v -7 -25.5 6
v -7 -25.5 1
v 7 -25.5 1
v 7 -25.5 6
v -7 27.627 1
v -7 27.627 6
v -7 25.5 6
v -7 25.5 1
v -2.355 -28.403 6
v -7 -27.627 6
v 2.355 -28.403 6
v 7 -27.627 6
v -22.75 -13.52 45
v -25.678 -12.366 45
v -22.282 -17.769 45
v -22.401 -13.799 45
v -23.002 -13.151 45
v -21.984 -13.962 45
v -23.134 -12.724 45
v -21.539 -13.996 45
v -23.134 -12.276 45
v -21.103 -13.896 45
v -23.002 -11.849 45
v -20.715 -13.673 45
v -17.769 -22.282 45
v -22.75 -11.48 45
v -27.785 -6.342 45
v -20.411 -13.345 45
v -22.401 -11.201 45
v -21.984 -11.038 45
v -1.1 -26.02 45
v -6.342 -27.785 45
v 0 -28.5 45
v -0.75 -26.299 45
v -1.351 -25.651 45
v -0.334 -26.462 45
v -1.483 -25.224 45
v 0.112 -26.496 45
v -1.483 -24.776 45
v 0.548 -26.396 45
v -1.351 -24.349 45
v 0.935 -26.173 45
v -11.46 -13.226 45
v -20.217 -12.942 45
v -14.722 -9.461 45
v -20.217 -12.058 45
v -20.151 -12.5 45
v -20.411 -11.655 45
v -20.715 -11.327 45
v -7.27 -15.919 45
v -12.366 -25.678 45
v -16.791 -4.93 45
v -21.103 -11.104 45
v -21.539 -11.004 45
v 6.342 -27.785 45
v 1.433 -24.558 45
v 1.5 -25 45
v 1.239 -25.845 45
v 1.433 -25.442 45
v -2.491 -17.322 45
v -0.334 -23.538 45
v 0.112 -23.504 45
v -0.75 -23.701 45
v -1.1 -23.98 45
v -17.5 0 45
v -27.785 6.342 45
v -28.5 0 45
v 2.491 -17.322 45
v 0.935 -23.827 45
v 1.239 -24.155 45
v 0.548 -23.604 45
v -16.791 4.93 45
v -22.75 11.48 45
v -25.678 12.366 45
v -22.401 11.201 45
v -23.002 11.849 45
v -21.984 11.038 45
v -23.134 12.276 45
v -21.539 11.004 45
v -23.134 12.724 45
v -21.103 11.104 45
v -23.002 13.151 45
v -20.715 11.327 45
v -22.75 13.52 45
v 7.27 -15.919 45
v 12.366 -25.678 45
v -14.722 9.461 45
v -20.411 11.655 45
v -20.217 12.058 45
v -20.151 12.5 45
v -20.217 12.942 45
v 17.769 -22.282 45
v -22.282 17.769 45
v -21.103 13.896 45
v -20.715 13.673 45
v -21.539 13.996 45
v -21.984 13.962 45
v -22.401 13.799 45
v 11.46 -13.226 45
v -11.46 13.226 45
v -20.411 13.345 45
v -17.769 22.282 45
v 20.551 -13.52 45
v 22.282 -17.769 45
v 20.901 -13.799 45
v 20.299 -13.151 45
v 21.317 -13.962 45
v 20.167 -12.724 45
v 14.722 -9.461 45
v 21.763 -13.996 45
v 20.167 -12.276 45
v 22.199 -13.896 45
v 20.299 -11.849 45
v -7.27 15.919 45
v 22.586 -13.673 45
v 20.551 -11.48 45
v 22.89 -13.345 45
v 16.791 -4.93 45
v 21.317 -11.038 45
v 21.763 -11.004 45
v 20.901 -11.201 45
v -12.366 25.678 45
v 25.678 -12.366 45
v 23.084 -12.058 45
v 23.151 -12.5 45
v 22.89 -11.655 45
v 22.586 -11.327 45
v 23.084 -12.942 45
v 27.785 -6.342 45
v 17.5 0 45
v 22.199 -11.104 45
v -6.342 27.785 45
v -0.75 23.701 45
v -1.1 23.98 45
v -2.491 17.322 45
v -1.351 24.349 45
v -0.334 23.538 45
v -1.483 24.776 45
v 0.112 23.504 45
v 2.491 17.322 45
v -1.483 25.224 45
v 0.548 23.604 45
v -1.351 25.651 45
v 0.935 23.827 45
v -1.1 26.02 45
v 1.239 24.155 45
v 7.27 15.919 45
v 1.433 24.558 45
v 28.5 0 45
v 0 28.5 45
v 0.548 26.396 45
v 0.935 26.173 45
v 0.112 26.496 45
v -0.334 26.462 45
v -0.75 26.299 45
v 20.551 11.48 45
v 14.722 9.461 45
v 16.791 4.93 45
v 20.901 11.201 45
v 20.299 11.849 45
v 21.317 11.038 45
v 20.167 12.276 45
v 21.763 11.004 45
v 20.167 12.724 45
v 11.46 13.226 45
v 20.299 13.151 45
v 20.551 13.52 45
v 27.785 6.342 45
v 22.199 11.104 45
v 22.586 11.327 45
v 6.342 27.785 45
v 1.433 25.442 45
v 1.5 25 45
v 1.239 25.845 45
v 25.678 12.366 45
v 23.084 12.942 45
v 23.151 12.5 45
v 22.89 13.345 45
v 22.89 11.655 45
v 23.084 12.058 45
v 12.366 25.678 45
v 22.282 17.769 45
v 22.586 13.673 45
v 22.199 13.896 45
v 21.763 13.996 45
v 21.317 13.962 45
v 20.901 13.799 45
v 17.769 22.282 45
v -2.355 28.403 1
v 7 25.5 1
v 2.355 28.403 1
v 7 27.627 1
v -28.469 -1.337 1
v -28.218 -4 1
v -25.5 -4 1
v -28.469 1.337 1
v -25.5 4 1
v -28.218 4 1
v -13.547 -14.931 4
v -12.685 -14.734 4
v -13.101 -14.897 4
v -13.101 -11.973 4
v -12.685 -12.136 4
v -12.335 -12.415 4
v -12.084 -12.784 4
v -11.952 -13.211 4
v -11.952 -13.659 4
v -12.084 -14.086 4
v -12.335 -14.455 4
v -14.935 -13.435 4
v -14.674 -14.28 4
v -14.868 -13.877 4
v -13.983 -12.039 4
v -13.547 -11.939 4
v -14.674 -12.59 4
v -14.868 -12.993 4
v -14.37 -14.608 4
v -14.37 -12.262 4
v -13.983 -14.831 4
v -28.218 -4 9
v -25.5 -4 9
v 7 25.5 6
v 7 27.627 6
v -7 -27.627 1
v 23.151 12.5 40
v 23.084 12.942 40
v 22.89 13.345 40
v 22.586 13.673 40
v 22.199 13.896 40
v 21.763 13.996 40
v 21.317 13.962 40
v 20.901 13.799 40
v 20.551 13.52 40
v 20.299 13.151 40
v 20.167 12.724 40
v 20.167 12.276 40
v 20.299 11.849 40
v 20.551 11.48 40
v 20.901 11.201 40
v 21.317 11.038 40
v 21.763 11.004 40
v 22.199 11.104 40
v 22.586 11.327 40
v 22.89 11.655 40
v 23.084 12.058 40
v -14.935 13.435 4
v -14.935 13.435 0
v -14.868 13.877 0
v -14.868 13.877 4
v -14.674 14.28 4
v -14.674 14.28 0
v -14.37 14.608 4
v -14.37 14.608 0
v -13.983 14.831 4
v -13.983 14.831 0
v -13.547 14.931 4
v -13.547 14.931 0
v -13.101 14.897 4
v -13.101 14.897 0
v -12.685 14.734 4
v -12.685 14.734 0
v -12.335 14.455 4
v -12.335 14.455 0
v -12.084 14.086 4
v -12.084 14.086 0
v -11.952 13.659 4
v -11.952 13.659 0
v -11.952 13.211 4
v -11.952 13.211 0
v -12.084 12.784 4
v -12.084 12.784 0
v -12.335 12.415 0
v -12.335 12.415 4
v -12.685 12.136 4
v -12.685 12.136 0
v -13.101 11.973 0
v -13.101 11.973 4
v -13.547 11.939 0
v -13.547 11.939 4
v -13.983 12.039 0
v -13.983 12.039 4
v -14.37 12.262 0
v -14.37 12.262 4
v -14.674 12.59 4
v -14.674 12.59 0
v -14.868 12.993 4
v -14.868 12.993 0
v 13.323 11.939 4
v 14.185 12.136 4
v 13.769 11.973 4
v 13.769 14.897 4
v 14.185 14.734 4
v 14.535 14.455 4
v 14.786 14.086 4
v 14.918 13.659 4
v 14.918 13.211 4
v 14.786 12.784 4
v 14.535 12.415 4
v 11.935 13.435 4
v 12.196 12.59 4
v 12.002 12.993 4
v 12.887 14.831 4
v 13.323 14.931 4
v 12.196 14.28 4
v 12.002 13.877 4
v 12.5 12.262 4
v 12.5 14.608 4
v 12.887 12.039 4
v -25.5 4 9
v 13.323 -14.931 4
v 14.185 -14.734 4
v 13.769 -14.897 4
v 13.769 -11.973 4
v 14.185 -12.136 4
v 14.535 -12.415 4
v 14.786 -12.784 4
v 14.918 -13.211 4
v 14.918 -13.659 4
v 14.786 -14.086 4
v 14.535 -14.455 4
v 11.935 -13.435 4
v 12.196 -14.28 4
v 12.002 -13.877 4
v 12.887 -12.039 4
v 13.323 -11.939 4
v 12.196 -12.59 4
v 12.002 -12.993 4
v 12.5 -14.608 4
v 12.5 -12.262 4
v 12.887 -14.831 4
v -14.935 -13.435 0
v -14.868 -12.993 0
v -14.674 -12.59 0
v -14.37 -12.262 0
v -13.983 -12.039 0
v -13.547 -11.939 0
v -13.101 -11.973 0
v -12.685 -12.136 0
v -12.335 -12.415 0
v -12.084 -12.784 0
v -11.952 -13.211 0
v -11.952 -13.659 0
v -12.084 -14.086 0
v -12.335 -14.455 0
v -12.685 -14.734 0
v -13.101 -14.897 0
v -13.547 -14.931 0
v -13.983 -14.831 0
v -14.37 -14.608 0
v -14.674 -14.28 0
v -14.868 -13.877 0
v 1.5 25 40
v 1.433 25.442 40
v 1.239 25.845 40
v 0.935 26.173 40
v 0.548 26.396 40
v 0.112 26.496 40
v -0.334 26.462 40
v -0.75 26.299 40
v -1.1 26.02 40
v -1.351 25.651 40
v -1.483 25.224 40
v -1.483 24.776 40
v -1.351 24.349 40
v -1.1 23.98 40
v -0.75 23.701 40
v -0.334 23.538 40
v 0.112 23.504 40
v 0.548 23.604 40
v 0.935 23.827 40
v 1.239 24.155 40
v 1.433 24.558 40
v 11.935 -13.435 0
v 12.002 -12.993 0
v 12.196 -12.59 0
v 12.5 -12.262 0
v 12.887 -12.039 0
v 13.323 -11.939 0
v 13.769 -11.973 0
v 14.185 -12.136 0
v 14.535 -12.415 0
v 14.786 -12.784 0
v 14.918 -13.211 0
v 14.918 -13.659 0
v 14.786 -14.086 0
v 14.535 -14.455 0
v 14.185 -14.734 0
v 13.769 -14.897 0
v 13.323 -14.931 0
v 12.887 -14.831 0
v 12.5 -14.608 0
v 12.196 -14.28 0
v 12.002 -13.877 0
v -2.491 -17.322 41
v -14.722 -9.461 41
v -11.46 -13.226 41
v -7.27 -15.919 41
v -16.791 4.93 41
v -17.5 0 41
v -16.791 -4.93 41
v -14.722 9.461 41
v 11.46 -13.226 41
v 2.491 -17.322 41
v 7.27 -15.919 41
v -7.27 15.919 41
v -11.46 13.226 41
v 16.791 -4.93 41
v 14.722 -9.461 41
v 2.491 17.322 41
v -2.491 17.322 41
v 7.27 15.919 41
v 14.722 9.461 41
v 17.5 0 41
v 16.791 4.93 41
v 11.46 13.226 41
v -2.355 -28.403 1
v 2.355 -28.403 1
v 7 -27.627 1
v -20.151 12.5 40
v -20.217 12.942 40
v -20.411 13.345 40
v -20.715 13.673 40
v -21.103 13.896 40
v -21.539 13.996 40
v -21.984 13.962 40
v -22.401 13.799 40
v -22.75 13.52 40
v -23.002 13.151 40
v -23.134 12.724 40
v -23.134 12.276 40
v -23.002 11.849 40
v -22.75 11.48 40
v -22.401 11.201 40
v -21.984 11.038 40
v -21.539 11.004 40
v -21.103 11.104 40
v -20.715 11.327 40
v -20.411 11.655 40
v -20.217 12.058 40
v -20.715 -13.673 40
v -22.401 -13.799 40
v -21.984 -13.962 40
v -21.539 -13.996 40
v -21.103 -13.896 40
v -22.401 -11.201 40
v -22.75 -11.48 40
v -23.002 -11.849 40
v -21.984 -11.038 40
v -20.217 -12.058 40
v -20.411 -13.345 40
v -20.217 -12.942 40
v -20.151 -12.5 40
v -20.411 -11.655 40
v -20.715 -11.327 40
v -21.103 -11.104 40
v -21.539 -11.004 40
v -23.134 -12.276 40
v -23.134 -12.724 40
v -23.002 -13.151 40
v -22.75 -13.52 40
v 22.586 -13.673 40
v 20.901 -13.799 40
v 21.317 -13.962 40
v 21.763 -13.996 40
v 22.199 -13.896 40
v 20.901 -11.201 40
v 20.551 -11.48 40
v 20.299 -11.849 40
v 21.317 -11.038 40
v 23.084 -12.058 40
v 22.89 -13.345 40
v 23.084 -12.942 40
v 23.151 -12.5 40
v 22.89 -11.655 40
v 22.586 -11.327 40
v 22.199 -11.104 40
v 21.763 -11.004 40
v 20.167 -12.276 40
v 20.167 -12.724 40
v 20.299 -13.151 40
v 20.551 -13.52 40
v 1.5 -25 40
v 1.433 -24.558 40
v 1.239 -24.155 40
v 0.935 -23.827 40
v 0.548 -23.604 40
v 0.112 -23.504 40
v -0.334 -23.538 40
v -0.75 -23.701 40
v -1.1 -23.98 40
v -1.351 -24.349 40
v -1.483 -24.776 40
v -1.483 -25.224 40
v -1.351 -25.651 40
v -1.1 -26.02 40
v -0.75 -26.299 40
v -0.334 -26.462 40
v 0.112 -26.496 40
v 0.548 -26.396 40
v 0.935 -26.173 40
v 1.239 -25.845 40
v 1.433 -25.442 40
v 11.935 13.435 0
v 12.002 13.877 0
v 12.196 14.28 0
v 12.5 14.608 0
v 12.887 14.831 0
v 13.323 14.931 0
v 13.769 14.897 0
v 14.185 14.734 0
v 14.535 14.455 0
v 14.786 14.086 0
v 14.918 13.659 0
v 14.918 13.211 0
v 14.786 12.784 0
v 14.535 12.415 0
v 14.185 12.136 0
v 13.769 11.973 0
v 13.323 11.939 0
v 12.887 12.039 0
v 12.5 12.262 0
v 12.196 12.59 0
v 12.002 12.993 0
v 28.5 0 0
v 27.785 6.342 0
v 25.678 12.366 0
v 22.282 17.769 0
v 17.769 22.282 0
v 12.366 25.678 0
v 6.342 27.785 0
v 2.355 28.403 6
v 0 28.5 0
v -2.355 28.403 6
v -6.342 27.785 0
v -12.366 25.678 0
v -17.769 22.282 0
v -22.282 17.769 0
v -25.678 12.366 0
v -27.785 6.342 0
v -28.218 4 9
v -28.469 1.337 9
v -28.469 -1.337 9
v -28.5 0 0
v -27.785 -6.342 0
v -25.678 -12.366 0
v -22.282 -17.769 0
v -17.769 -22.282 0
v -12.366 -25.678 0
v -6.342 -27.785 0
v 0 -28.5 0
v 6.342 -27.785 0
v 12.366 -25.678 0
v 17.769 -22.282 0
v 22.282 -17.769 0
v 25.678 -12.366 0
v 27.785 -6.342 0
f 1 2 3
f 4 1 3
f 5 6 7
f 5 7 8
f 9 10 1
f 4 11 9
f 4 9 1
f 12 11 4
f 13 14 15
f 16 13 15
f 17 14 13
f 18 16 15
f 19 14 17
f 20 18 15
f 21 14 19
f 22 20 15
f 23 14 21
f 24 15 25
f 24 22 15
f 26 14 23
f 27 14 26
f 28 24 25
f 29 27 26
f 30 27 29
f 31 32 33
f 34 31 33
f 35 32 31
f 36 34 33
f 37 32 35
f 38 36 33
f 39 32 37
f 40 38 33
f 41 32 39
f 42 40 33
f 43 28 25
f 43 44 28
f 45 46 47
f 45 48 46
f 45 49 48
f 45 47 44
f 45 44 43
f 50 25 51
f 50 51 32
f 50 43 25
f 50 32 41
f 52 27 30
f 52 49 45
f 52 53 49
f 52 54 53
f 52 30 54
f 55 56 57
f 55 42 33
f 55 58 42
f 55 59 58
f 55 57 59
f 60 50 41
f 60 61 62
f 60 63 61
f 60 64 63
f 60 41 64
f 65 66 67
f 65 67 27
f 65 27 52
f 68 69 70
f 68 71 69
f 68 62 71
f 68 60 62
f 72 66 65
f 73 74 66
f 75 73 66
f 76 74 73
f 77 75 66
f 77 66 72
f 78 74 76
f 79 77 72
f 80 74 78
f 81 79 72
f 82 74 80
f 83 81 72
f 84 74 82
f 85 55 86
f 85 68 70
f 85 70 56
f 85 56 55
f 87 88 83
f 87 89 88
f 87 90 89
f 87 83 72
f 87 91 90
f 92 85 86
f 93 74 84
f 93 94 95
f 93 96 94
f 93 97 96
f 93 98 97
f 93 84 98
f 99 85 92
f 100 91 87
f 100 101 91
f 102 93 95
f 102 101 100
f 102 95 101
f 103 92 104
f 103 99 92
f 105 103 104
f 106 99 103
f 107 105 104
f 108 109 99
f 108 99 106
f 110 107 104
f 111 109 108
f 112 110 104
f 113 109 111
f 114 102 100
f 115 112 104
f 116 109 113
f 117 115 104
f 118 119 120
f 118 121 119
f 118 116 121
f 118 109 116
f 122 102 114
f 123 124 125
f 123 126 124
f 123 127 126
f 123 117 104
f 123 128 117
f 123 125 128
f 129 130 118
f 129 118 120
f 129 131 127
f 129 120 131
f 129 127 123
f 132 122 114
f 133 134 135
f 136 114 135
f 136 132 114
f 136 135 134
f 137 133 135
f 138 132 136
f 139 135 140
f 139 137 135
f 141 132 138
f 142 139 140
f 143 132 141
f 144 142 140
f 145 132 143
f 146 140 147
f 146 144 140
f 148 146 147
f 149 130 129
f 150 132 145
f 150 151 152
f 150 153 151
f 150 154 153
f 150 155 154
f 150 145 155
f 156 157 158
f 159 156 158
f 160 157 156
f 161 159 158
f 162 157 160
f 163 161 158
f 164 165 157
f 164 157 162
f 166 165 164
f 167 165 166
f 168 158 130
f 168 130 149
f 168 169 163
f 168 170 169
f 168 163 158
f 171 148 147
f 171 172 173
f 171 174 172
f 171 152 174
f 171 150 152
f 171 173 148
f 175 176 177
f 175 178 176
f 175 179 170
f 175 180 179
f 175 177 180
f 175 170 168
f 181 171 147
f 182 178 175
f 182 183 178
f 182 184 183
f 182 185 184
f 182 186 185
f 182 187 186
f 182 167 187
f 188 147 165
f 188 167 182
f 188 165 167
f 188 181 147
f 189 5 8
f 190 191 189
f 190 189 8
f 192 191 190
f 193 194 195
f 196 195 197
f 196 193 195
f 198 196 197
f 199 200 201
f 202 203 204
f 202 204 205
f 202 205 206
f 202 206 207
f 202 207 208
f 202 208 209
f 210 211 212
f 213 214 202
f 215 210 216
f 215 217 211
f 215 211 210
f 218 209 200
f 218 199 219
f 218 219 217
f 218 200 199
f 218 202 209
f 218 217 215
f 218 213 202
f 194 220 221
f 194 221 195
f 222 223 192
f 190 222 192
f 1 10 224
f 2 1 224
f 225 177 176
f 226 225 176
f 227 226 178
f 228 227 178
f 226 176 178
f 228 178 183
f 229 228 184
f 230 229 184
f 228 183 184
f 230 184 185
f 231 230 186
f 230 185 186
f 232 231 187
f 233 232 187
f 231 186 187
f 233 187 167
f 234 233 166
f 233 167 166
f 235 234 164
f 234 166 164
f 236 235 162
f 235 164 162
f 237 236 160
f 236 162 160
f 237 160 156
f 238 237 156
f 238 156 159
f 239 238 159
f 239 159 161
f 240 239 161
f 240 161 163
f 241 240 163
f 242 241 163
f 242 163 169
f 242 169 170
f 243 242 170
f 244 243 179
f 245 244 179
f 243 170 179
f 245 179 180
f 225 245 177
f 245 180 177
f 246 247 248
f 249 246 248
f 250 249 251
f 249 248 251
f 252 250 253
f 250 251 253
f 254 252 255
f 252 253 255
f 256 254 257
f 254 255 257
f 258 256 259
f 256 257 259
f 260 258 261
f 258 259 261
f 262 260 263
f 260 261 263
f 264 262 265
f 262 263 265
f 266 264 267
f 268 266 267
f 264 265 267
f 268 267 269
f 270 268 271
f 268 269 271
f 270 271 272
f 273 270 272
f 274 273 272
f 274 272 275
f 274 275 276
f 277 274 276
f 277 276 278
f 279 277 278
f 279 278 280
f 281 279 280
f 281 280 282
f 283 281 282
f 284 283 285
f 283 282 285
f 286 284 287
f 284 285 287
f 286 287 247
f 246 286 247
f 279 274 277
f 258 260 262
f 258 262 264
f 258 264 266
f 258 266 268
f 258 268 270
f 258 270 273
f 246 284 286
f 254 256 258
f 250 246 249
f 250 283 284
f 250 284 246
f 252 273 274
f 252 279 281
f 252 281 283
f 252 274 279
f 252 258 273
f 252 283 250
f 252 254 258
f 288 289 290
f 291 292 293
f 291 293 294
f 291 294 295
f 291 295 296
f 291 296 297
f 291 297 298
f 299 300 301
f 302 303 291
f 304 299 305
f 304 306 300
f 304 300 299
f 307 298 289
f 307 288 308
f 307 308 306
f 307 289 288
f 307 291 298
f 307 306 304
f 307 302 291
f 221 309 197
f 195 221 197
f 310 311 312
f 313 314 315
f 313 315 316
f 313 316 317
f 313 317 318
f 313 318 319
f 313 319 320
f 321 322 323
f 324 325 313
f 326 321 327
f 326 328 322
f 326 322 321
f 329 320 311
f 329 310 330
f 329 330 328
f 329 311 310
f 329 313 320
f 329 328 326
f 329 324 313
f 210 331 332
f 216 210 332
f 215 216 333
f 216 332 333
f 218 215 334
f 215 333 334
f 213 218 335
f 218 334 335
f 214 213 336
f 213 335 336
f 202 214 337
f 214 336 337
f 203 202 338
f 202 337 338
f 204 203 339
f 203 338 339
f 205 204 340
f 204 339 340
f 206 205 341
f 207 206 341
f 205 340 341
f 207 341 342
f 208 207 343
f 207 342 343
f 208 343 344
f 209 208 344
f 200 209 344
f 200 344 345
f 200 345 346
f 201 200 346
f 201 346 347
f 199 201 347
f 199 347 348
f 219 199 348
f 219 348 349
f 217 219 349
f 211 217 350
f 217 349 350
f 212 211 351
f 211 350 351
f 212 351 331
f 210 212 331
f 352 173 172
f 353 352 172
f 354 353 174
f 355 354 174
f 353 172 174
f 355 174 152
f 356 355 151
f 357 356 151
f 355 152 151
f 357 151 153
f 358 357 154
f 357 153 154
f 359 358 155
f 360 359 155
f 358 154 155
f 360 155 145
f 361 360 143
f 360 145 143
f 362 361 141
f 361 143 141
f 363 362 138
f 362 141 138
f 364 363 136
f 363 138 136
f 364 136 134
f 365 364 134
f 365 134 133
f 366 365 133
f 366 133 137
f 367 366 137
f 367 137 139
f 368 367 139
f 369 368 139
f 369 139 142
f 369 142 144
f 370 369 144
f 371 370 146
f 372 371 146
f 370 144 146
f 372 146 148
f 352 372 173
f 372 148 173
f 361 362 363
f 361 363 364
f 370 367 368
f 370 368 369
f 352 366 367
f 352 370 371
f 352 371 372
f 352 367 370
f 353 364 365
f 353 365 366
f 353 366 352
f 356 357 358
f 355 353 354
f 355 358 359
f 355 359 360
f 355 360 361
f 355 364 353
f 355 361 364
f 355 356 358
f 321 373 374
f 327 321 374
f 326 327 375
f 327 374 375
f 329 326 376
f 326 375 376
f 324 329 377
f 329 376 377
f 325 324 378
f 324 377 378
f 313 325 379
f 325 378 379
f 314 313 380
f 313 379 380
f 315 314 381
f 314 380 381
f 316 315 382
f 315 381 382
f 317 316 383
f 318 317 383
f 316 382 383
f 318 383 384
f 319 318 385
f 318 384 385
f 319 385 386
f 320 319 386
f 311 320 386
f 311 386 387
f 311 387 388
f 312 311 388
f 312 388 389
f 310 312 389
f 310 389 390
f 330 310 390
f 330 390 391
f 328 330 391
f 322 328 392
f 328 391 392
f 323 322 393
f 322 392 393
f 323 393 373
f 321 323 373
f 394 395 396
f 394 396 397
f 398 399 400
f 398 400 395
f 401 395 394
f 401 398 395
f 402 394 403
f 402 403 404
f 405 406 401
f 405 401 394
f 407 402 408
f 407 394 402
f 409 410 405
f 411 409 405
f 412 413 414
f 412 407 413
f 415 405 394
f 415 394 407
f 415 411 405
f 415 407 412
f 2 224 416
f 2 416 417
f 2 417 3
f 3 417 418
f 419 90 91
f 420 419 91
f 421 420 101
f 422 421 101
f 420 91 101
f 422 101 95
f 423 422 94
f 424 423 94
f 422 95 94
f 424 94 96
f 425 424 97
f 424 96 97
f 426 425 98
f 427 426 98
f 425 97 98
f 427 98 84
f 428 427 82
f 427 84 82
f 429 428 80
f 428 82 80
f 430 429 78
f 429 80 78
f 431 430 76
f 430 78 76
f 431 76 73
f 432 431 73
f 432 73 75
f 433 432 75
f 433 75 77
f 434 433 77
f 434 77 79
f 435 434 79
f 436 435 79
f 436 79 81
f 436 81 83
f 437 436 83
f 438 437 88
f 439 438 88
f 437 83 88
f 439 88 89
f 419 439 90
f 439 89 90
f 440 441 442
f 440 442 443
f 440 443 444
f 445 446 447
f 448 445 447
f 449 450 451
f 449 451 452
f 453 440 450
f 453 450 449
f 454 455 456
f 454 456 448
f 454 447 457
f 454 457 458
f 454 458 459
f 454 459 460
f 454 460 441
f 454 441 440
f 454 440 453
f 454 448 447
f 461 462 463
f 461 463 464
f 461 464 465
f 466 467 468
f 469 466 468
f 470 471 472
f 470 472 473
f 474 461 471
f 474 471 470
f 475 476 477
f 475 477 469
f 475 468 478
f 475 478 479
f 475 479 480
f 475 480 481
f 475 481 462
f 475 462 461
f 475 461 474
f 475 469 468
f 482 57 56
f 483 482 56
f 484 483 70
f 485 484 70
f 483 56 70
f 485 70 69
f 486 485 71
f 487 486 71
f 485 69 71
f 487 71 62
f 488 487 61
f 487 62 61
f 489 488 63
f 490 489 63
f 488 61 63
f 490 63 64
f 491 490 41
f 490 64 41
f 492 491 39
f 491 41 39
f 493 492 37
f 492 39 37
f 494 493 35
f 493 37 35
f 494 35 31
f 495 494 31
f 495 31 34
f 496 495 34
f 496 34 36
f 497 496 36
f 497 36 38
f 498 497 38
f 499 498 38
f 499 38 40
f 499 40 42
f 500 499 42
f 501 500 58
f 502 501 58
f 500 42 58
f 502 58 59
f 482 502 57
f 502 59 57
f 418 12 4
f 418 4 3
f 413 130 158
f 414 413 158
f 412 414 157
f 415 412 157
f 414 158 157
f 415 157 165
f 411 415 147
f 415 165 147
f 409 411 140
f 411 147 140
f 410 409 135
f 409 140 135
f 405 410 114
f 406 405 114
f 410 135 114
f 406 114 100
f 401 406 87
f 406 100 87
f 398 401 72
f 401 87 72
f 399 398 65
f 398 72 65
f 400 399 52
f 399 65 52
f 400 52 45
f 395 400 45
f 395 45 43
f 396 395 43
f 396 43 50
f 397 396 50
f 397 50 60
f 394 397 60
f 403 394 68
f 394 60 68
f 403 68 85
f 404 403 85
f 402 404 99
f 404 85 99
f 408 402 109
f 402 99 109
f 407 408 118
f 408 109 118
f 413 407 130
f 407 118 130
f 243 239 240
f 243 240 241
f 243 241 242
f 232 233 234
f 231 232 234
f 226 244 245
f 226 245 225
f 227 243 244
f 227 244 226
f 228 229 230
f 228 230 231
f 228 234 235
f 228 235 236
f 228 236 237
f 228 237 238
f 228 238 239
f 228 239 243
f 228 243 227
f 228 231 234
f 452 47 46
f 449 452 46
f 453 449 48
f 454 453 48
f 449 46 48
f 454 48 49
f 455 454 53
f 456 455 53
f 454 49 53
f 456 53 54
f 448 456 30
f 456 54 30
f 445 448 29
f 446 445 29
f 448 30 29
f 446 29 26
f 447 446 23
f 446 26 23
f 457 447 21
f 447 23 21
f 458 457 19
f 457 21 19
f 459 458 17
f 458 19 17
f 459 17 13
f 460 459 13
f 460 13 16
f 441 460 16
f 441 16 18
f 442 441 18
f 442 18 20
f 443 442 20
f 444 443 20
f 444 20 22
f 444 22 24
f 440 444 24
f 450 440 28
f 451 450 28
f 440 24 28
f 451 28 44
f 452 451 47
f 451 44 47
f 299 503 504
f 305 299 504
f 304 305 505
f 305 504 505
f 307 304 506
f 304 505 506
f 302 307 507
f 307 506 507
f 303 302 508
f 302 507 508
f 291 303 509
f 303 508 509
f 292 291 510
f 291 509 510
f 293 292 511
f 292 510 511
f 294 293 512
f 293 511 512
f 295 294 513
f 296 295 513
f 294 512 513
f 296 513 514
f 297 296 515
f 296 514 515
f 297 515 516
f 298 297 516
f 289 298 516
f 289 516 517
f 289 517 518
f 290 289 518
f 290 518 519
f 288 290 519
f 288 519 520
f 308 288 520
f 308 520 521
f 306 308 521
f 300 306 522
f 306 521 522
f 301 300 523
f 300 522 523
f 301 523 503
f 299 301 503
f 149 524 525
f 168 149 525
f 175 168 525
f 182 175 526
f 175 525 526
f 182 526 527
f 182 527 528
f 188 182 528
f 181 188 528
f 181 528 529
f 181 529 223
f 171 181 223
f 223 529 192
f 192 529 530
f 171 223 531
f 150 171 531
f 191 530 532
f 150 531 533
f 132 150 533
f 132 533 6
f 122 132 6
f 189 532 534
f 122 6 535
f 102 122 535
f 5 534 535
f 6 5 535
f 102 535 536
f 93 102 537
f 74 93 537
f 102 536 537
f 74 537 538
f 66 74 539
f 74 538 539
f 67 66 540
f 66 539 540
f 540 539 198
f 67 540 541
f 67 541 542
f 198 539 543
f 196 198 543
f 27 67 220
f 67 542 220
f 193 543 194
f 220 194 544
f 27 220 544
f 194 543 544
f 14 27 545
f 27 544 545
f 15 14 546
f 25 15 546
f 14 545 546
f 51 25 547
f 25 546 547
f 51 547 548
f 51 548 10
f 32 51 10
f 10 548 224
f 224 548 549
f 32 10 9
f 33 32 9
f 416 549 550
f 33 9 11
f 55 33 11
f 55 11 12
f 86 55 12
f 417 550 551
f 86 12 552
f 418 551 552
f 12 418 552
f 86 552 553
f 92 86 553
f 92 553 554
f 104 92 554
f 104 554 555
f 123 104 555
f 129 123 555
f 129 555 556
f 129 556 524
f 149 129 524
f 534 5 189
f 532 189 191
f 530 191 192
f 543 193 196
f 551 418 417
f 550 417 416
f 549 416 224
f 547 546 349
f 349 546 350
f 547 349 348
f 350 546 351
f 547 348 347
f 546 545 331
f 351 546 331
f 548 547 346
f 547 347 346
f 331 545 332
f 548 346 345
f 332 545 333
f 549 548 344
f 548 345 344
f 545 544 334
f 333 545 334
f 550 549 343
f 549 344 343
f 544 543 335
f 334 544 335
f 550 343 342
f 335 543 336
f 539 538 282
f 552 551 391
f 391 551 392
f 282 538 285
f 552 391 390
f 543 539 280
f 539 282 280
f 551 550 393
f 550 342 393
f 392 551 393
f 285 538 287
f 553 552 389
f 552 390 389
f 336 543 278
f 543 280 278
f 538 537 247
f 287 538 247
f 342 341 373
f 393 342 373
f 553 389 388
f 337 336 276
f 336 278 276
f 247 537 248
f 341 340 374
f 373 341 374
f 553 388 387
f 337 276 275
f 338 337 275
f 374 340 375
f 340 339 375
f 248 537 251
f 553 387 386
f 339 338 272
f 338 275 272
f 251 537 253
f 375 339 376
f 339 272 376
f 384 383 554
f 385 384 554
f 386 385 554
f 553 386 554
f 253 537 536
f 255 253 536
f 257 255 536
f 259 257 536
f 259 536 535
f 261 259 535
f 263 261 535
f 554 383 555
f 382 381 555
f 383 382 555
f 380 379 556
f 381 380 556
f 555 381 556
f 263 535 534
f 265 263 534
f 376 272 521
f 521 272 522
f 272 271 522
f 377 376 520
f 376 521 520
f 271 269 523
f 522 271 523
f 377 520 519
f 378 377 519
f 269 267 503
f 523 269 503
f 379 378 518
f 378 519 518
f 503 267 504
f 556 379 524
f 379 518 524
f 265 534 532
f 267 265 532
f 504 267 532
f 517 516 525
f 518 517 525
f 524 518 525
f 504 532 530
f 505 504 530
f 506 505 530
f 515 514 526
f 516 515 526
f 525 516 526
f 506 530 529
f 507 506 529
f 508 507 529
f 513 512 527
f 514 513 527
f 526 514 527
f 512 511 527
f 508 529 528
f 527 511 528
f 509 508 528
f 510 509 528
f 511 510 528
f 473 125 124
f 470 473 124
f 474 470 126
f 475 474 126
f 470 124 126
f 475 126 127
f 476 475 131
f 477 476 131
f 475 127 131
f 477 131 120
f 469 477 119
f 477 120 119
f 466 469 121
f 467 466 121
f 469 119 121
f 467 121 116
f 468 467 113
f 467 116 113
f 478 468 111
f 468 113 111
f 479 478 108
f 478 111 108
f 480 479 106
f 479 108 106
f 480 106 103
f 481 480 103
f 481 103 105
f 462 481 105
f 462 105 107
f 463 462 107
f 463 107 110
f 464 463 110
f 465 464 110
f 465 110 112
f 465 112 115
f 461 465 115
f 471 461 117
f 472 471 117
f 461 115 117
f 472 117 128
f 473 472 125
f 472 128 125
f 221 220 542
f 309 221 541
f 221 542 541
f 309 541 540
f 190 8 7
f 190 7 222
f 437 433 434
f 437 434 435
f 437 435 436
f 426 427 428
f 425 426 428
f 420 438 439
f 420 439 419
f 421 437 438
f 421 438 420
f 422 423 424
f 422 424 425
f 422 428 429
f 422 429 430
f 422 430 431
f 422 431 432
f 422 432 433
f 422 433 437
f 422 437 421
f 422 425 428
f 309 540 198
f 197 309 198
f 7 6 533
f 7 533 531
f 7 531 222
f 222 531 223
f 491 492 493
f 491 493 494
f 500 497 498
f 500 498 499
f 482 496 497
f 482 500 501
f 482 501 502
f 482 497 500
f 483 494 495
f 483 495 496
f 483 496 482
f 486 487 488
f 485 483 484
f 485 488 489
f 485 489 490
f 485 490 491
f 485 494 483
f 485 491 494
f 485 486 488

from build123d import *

# Parameters (mm, degrees)
SKETCH_1_R          = 28.5
EXTRUDE_1_DEPTH     = 45
SKETCH_2_R          = 17.5
CUT_EXTRUDE_2_DEPTH = 4
SKETCH_2_5_R        = 1.5
CUT_EXTRUDE_3_DEPTH = 5
SKETCH_4_R          = 1.5
CUT_EXTRUDE_4_DEPTH = 4
SKETCH_9_W          = 14
SKETCH_9_H          = 5
CUT_EXTRUDE_6_DEPTH = 3
SKETCH_10_W         = 8
SKETCH_10_H         = 8
CUT_EXTRUDE_7_DEPTH = 3


with BuildPart() as part:
    # 草图1 → 凸台-拉伸1 (new body)
    with BuildSketch(Plane.XY):
        Circle(SKETCH_1_R)
    extrude(amount=EXTRUDE_1_DEPTH)

    # 草图2 → 切除-拉伸2 (cut)
    with BuildSketch(Plane.XY.offset(45)):
        Circle(SKETCH_2_R)
    extrude(amount=-CUT_EXTRUDE_2_DEPTH, mode=Mode.SUBTRACT)

    # 草图2<5> → 切除-拉伸3 (cut)
    with BuildSketch(Plane.XY.offset(45)):
        with Locations((0, 25)):
            Circle(SKETCH_2_5_R)
        with Locations((21.650635095, 12.5)):
            Circle(SKETCH_2_5_R)
        with Locations((21.650635095, -12.5)):
            Circle(SKETCH_2_5_R)
        with Locations((0, -25)):
            Circle(SKETCH_2_5_R)
        with Locations((-21.650635095, -12.5)):
            Circle(SKETCH_2_5_R)
        with Locations((-21.650635095, 12.5)):
            Circle(SKETCH_2_5_R)
    extrude(amount=-CUT_EXTRUDE_3_DEPTH, mode=Mode.SUBTRACT)

    # 草图4 → 切除-拉伸4 (cut)
    with BuildSketch(Plane(origin=(0, 0, 0), x_dir=(-1, 0, 0), z_dir=(0, 0, -1))):
        with Locations((13.435028843, 13.435028843)):
            Circle(SKETCH_4_R)
        with Locations((-13.435028843, 13.435028843)):
            Circle(SKETCH_4_R)
        with Locations((13.435028843, -13.435028843)):
            Circle(SKETCH_4_R)
        with Locations((-13.435028843, -13.435028843)):
            Circle(SKETCH_4_R)
    extrude(amount=-CUT_EXTRUDE_4_DEPTH, mode=Mode.SUBTRACT)

    # 草图9 → 切除-拉伸6 (cut)
    with BuildSketch(Plane(origin=(0, 28.5, 0), x_dir=(1, 0, 0), z_dir=(0, 1, 0))):
        with Locations((0, -3.5)):
            Rectangle(SKETCH_9_W, SKETCH_9_H)
    cut_extrude_6 = extrude(amount=-CUT_EXTRUDE_6_DEPTH, mode=Mode.SUBTRACT)

    # 镜向1: 切除-拉伸6 across plane
    add(cut_extrude_6.mirror(Plane.ZX), mode=Mode.SUBTRACT)

    # 草图10 → 切除-拉伸7 (cut)
    with BuildSketch(Plane(origin=(-28.5, 0, 0), x_dir=(0, 0, -1), z_dir=(1, 0, 0))):
        with Locations((-5, 0)):
            Rectangle(SKETCH_10_W, SKETCH_10_H)
    extrude(amount=CUT_EXTRUDE_7_DEPTH, mode=Mode.SUBTRACT)


solid = part.part
